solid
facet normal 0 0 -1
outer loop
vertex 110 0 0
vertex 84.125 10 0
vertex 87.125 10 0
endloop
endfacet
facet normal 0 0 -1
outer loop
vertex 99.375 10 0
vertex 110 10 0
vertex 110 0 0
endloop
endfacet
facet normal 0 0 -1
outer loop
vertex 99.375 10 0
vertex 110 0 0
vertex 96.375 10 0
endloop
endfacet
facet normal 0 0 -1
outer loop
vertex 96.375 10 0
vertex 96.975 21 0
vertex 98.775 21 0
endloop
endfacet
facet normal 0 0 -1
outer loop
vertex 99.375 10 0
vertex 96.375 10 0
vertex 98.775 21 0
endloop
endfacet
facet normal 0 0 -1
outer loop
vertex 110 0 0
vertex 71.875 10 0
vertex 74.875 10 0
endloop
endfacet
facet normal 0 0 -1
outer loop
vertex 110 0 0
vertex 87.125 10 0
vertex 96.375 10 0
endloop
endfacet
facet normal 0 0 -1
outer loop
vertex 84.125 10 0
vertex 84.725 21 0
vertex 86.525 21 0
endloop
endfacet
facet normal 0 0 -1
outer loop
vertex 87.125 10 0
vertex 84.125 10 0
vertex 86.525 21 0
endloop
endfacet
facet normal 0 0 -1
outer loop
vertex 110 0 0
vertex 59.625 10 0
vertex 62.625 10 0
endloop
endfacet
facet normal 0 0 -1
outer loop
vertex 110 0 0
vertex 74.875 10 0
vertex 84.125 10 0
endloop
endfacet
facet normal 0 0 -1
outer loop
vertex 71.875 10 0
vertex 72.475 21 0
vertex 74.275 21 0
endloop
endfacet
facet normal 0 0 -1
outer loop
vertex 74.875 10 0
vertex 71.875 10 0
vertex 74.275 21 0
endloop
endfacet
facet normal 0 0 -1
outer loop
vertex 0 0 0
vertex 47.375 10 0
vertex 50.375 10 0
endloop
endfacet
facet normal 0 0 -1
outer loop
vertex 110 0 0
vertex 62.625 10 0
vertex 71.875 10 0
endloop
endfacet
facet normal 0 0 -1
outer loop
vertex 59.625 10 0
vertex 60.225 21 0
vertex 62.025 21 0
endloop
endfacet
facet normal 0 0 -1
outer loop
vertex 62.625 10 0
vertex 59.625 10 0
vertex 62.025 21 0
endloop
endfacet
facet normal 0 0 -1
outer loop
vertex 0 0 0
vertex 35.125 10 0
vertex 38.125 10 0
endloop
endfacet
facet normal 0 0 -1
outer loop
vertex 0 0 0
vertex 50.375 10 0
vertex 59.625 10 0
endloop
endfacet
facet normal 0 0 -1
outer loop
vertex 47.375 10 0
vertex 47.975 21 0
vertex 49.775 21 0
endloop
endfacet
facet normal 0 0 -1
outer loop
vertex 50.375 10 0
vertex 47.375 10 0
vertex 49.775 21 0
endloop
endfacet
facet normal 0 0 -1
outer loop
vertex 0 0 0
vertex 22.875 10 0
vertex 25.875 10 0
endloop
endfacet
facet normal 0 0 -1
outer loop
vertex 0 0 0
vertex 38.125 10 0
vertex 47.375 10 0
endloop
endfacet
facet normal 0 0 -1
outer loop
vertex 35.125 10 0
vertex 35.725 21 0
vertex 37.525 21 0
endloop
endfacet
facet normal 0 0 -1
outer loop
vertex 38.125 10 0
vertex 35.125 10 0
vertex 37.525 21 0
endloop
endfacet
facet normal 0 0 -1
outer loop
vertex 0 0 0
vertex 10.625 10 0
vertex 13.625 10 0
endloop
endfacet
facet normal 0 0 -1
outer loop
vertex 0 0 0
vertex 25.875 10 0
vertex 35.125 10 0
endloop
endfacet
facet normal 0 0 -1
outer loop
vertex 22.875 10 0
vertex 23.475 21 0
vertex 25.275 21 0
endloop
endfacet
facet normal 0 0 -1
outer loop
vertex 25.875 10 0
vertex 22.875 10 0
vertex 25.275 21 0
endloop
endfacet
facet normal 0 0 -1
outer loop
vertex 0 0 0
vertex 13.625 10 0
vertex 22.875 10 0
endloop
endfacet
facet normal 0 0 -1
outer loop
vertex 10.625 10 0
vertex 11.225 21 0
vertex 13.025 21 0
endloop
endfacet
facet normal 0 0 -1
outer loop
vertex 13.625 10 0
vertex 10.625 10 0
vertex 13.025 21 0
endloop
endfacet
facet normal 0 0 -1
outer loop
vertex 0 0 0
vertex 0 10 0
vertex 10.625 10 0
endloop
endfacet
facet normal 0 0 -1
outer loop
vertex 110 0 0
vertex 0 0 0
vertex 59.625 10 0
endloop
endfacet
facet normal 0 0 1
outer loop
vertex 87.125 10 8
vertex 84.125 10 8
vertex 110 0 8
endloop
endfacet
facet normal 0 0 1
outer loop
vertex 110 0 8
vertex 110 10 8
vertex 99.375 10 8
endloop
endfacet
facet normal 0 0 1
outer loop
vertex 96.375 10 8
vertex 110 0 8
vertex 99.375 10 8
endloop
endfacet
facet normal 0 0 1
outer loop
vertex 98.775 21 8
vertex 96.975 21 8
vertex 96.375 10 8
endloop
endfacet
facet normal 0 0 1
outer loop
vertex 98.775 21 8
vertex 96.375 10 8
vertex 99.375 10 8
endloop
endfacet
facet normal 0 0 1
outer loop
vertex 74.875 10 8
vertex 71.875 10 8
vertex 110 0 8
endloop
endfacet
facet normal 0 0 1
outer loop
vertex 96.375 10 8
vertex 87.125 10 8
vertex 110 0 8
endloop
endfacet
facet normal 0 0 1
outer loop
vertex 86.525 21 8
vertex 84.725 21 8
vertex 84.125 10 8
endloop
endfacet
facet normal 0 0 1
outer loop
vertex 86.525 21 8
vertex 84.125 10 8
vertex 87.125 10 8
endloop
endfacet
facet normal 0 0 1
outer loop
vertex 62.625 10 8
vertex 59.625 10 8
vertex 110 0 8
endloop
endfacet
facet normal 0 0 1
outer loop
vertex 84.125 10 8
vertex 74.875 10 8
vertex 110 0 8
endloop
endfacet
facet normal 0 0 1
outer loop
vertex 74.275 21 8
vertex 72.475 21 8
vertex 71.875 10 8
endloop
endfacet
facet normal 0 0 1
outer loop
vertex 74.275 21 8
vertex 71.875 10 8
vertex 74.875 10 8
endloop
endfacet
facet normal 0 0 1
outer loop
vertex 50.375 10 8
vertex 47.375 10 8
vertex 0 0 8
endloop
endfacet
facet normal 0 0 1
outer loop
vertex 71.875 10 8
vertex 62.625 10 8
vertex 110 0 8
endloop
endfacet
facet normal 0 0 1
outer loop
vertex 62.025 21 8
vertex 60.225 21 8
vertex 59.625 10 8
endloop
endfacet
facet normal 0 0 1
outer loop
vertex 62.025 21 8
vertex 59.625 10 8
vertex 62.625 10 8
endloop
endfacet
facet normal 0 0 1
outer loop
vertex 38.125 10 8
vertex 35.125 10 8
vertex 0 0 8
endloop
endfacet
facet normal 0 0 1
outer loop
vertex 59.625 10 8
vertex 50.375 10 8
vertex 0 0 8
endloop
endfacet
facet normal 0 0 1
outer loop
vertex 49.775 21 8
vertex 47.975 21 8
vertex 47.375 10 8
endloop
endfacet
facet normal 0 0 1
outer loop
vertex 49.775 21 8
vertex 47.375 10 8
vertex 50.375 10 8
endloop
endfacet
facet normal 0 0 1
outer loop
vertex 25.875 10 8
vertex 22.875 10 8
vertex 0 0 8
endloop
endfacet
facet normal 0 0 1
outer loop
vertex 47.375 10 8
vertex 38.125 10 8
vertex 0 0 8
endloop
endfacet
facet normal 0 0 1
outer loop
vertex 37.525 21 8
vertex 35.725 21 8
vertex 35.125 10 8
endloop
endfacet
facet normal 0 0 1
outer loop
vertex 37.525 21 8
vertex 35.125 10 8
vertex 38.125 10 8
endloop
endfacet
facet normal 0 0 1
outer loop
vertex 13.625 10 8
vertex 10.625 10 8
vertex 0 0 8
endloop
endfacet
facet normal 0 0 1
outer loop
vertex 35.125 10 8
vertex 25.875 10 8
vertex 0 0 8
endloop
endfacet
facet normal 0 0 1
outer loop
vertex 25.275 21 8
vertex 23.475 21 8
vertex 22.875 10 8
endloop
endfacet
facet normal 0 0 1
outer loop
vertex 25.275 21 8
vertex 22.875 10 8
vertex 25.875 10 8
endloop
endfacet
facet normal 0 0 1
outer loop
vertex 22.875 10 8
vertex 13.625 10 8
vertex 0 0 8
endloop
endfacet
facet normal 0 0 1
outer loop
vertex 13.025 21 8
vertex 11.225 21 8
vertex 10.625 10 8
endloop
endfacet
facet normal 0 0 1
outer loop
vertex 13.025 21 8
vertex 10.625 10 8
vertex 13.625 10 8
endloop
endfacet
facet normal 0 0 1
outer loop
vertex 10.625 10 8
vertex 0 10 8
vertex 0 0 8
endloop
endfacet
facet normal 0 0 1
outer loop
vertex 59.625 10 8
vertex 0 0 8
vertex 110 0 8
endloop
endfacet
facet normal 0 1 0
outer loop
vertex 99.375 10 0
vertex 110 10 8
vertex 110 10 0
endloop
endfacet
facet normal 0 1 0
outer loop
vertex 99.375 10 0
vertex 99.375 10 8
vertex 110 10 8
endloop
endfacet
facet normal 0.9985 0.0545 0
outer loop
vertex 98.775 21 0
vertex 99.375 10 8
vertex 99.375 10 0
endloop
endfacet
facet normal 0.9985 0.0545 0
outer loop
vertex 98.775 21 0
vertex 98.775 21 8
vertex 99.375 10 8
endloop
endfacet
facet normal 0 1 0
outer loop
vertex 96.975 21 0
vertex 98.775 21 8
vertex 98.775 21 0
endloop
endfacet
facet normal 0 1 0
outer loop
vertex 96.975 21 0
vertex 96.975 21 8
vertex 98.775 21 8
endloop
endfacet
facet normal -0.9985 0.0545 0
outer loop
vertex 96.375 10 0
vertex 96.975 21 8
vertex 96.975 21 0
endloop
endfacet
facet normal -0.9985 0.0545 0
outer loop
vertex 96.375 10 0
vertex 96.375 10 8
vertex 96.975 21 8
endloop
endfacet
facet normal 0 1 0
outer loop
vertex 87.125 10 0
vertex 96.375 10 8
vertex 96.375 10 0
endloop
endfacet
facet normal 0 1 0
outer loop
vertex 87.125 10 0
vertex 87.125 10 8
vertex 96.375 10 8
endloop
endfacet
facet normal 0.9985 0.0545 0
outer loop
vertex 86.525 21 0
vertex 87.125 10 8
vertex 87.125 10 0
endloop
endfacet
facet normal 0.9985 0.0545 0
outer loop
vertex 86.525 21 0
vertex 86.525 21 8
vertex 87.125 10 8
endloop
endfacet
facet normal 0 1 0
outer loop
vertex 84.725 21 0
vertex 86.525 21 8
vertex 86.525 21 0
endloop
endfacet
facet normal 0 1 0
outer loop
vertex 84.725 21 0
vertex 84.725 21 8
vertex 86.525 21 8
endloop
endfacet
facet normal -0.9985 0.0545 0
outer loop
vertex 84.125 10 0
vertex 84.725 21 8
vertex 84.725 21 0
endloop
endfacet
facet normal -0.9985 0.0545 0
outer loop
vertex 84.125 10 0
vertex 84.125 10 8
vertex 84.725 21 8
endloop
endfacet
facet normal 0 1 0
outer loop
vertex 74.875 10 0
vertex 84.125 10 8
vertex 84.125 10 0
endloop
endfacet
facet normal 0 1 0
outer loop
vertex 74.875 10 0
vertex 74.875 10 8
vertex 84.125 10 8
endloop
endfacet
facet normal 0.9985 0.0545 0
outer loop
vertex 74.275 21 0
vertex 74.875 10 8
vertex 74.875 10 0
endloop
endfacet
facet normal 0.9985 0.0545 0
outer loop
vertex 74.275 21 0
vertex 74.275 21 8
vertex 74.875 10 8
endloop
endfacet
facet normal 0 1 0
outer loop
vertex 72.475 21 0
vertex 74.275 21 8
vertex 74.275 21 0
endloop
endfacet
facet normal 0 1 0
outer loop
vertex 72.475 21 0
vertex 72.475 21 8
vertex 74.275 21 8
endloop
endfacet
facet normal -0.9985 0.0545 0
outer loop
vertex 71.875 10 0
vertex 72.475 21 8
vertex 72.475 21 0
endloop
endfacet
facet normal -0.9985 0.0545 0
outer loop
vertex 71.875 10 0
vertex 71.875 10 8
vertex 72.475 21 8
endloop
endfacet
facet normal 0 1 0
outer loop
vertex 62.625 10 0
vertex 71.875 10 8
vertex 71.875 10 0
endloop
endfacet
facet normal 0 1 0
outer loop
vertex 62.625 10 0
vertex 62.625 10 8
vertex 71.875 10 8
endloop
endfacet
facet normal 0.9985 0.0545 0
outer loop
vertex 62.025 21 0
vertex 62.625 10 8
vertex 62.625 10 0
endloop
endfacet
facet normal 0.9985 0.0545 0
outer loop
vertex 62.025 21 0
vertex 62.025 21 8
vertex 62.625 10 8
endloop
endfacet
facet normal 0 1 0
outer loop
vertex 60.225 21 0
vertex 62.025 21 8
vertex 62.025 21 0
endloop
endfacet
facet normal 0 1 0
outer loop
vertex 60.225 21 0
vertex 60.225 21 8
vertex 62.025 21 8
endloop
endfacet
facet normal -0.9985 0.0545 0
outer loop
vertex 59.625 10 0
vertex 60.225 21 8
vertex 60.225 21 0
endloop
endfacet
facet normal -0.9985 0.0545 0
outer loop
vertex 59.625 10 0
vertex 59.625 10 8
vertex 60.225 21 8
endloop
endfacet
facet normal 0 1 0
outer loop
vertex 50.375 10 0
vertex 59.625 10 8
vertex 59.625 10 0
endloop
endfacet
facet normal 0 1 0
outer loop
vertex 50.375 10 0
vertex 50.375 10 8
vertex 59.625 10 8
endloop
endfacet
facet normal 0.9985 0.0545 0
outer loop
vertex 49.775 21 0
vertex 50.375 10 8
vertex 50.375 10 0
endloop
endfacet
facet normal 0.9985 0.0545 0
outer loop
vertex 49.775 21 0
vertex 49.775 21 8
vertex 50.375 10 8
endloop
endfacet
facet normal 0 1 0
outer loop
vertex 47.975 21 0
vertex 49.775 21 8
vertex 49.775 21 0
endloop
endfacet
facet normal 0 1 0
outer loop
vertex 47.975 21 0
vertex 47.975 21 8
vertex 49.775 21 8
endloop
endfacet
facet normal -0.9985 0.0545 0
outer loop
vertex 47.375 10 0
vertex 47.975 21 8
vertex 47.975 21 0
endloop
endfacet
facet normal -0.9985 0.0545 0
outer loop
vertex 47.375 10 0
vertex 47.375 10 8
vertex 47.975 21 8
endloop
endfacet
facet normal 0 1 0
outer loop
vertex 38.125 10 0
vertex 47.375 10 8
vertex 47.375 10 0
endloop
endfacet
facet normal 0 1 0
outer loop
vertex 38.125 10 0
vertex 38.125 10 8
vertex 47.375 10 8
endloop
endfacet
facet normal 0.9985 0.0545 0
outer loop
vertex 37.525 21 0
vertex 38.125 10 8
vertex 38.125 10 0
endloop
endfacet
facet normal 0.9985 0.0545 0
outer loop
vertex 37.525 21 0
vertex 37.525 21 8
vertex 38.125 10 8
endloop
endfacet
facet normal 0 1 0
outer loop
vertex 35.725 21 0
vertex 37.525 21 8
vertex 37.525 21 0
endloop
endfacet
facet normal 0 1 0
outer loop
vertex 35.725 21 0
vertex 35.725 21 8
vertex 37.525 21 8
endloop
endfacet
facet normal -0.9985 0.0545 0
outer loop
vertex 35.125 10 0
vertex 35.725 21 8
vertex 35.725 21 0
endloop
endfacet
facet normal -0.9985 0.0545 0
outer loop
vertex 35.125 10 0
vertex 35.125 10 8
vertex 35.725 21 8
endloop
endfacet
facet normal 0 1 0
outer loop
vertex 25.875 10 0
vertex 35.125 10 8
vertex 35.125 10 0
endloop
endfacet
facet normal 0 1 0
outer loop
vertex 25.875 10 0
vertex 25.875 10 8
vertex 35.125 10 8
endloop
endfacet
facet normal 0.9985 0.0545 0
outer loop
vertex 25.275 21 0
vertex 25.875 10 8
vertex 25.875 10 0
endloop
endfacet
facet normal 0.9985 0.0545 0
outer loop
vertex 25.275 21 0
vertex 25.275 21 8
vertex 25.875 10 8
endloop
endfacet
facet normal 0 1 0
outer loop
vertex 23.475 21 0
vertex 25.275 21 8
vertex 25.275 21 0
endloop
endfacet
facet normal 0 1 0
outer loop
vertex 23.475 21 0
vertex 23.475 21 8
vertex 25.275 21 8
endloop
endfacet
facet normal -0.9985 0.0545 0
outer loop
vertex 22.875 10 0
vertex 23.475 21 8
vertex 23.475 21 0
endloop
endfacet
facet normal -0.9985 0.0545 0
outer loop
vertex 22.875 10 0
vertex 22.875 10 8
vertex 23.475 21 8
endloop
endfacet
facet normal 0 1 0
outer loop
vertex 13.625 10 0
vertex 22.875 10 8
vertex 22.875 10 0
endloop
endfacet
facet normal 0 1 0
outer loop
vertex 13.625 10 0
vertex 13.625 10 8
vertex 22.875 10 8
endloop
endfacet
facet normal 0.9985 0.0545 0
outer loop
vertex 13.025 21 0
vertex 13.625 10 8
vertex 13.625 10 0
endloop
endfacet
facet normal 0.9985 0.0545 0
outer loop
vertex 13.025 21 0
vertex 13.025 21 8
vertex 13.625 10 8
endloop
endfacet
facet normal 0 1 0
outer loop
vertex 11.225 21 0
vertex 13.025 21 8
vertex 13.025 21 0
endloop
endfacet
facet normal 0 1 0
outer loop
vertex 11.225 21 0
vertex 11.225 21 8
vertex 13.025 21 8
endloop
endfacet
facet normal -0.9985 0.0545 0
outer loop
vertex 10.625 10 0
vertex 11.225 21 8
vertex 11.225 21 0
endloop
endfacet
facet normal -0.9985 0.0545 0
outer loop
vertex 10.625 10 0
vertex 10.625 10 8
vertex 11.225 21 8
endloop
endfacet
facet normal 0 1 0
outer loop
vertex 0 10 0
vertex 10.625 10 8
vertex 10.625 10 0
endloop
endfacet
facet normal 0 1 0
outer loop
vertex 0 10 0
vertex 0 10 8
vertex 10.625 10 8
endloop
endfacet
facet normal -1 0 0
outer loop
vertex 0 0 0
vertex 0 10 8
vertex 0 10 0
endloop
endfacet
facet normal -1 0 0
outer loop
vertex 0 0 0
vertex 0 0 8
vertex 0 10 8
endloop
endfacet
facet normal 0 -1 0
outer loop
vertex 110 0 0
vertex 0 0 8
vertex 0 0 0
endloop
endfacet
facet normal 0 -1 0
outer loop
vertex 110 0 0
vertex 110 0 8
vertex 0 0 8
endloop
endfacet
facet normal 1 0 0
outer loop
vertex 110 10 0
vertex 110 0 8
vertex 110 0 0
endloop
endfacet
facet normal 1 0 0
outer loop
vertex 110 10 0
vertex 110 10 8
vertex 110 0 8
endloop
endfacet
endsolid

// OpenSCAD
$fn = 32;

// ----------------------------------------------------------------------
// Gear rack: 8 teeth on a 110 mm bar, pitch 12.25 mm
// ----------------------------------------------------------------------

// --- parameters (mm) ---
profile_height = 8;       // extrusion height
profile_points = 36;      // points of the closed outline

profile = [[0, 0], [110, 0], [110, 10], [99.375, 10], [98.775, 21], [96.975, 21], [96.375, 10], [87.125, 10], [86.525, 21], [84.725, 21], [84.125, 10], [74.875, 10], [74.275, 21], [72.475, 21], [71.875, 10], [62.625, 10], [62.025, 21], [60.225, 21], [59.625, 10], [50.375, 10], [49.775, 21], [47.975, 21], [47.375, 10], [38.125, 10], [37.525, 21], [35.725, 21], [35.125, 10], [25.875, 10], [25.275, 21], [23.475, 21], [22.875, 10], [13.625, 10], [13.025, 21], [11.225, 21], [10.625, 10], [0, 10]];  // single closed polygon, 36 points, counter clockwise

// --- the one profile operation ---
linear_extrude(height = profile_height) polygon(points = profile);
